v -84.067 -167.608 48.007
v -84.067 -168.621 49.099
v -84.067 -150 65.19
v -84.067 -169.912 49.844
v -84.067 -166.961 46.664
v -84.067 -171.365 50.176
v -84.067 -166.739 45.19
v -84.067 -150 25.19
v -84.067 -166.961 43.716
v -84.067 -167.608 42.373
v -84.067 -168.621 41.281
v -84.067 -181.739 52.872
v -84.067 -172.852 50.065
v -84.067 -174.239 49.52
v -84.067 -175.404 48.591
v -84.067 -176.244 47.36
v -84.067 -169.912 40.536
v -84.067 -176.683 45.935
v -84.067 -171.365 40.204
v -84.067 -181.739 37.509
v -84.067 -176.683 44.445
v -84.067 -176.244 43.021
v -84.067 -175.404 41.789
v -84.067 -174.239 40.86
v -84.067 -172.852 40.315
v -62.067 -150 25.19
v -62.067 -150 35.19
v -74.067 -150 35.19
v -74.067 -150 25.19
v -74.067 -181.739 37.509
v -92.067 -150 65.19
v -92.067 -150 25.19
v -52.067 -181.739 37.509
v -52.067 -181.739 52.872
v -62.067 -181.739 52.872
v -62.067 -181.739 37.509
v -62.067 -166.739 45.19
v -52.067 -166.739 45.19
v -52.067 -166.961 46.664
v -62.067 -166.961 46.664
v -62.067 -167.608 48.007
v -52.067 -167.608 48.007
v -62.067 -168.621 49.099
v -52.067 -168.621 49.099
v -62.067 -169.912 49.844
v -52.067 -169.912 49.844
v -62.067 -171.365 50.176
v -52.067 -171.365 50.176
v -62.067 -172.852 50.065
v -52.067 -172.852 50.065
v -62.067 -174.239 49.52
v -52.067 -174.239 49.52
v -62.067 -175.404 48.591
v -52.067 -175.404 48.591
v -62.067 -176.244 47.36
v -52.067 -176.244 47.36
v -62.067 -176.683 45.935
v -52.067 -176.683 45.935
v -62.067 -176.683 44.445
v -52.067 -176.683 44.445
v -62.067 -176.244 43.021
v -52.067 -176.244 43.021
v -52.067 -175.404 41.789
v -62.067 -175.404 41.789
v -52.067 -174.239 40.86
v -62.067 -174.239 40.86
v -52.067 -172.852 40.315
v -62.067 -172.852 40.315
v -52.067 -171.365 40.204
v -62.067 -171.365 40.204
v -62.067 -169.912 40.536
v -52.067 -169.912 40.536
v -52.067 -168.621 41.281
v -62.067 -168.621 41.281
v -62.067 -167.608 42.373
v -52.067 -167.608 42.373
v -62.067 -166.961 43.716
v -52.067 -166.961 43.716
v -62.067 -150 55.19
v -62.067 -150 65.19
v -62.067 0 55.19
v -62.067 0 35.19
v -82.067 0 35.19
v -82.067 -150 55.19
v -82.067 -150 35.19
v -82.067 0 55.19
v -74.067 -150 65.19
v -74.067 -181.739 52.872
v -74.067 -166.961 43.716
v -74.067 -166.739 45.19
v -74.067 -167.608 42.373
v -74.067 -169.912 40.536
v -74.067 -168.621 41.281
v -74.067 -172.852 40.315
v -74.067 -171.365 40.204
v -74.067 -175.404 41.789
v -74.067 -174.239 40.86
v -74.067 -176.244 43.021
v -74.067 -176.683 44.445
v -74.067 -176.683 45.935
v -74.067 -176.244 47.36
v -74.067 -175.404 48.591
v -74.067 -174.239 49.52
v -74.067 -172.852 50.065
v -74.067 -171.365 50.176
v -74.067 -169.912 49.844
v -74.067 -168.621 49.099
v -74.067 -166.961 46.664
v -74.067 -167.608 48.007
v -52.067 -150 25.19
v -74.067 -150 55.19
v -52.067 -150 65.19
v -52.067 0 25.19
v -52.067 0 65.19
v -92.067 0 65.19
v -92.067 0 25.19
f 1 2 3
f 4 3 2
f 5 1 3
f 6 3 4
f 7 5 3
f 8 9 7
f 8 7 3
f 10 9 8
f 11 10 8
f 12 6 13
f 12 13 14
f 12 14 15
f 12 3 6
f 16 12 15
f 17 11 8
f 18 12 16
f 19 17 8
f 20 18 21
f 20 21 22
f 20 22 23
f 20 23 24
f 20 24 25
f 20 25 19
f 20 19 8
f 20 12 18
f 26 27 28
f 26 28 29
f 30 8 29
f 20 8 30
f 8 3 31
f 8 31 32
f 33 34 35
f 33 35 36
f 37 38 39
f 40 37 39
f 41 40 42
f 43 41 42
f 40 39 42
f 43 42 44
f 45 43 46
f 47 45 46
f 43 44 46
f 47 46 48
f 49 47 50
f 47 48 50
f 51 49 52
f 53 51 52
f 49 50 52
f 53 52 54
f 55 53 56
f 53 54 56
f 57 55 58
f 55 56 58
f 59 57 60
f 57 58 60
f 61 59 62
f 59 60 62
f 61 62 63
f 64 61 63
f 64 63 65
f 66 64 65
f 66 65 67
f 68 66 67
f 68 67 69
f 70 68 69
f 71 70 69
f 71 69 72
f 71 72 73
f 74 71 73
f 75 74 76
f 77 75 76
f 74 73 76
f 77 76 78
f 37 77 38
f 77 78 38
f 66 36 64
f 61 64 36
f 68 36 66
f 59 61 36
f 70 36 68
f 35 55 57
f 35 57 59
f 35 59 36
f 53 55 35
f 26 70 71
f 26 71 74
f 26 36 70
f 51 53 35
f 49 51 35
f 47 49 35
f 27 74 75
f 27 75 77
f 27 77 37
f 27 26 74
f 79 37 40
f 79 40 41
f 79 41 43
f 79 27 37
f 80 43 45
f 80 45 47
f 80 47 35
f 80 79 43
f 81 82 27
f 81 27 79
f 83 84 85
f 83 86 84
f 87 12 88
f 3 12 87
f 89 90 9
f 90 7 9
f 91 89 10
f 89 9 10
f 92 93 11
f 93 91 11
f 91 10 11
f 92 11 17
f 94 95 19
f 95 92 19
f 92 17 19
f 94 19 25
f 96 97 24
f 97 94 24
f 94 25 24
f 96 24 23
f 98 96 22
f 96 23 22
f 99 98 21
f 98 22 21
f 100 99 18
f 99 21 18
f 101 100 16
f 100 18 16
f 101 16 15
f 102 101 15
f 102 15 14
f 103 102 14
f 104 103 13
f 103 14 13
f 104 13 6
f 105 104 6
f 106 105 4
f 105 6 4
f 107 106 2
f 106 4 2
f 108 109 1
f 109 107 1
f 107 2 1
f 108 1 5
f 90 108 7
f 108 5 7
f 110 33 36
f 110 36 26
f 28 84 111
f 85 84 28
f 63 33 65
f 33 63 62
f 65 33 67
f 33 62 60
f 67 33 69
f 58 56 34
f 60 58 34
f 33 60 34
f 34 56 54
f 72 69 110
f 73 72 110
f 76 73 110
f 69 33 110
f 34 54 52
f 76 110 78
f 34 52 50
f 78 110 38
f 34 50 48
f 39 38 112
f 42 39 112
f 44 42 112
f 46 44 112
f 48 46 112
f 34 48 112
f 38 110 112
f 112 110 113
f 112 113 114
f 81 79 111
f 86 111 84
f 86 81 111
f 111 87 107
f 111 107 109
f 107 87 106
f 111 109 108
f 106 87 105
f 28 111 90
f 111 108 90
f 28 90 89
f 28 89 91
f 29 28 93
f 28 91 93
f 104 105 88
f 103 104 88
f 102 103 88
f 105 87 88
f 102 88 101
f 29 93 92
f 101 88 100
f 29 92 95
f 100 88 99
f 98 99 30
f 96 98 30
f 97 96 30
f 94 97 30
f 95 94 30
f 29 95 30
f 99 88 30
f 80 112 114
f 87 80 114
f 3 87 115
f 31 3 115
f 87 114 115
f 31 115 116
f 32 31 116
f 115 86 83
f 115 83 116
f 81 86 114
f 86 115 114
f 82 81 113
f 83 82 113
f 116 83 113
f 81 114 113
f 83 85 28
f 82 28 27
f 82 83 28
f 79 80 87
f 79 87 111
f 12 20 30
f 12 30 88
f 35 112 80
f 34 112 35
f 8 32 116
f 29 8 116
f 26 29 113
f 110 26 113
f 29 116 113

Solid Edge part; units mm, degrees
sketch "Sketch1" plane through (0, 0, 0) normal (0, -1, 0) x (1, 0, 0)
  line L0 (-92.067, 25.1901) -> (-52.067, 25.1901)
  line L1 (-52.067, 25.1901) -> (-52.067, 65.1901)
  line L2 (-52.067, 65.1901) -> (-92.067, 65.1901)
  line L3 (-92.067, 65.1901) -> (-92.067, 25.1901)
  line L4 (-82.067, 35.1901) -> (-62.067, 35.1901)
  line L5 (-62.067, 35.1901) -> (-62.067, 55.1901)
  line L6 (-62.067, 55.1901) -> (-82.067, 55.1901)
  line L7 (-82.067, 55.1901) -> (-82.067, 35.1901)
  dimension "D1" = 20
  dimension "D2" = 20
  dimension "D3" = 40
  dimension "D4" = 40
extrude "Protrusion1" add sketch "Sketch1" along normal blind 150
sketch "Sketch2" plane through (-52.067, -75, 45.1901) normal (1, 0, 0) x (0, 1, 0)
  circle A0 centre (-96.7389, 0) radius 5
  line L0 (-75, 20) -> (-106.7389, 7.6815)
  line L1 (-106.7389, 7.6815) -> (-106.7389, -7.6815)
  line L2 (-106.7389, -7.6815) -> (-75, -20)
  line L3 (-75, -20) -> (-75, 20)
  dimension "D1" = 10
  dimension "D2" = 15.3631
  dimension "D3" = 10
extrude "ExtrudedProtrusion_2" add sketch "Sketch2" against normal blind 10
mirror "Mirror1" about plane through (-68.067, -90.8694, 45.1901) normal (1, 0, 0) of "ExtrudedProtrusion_2"
